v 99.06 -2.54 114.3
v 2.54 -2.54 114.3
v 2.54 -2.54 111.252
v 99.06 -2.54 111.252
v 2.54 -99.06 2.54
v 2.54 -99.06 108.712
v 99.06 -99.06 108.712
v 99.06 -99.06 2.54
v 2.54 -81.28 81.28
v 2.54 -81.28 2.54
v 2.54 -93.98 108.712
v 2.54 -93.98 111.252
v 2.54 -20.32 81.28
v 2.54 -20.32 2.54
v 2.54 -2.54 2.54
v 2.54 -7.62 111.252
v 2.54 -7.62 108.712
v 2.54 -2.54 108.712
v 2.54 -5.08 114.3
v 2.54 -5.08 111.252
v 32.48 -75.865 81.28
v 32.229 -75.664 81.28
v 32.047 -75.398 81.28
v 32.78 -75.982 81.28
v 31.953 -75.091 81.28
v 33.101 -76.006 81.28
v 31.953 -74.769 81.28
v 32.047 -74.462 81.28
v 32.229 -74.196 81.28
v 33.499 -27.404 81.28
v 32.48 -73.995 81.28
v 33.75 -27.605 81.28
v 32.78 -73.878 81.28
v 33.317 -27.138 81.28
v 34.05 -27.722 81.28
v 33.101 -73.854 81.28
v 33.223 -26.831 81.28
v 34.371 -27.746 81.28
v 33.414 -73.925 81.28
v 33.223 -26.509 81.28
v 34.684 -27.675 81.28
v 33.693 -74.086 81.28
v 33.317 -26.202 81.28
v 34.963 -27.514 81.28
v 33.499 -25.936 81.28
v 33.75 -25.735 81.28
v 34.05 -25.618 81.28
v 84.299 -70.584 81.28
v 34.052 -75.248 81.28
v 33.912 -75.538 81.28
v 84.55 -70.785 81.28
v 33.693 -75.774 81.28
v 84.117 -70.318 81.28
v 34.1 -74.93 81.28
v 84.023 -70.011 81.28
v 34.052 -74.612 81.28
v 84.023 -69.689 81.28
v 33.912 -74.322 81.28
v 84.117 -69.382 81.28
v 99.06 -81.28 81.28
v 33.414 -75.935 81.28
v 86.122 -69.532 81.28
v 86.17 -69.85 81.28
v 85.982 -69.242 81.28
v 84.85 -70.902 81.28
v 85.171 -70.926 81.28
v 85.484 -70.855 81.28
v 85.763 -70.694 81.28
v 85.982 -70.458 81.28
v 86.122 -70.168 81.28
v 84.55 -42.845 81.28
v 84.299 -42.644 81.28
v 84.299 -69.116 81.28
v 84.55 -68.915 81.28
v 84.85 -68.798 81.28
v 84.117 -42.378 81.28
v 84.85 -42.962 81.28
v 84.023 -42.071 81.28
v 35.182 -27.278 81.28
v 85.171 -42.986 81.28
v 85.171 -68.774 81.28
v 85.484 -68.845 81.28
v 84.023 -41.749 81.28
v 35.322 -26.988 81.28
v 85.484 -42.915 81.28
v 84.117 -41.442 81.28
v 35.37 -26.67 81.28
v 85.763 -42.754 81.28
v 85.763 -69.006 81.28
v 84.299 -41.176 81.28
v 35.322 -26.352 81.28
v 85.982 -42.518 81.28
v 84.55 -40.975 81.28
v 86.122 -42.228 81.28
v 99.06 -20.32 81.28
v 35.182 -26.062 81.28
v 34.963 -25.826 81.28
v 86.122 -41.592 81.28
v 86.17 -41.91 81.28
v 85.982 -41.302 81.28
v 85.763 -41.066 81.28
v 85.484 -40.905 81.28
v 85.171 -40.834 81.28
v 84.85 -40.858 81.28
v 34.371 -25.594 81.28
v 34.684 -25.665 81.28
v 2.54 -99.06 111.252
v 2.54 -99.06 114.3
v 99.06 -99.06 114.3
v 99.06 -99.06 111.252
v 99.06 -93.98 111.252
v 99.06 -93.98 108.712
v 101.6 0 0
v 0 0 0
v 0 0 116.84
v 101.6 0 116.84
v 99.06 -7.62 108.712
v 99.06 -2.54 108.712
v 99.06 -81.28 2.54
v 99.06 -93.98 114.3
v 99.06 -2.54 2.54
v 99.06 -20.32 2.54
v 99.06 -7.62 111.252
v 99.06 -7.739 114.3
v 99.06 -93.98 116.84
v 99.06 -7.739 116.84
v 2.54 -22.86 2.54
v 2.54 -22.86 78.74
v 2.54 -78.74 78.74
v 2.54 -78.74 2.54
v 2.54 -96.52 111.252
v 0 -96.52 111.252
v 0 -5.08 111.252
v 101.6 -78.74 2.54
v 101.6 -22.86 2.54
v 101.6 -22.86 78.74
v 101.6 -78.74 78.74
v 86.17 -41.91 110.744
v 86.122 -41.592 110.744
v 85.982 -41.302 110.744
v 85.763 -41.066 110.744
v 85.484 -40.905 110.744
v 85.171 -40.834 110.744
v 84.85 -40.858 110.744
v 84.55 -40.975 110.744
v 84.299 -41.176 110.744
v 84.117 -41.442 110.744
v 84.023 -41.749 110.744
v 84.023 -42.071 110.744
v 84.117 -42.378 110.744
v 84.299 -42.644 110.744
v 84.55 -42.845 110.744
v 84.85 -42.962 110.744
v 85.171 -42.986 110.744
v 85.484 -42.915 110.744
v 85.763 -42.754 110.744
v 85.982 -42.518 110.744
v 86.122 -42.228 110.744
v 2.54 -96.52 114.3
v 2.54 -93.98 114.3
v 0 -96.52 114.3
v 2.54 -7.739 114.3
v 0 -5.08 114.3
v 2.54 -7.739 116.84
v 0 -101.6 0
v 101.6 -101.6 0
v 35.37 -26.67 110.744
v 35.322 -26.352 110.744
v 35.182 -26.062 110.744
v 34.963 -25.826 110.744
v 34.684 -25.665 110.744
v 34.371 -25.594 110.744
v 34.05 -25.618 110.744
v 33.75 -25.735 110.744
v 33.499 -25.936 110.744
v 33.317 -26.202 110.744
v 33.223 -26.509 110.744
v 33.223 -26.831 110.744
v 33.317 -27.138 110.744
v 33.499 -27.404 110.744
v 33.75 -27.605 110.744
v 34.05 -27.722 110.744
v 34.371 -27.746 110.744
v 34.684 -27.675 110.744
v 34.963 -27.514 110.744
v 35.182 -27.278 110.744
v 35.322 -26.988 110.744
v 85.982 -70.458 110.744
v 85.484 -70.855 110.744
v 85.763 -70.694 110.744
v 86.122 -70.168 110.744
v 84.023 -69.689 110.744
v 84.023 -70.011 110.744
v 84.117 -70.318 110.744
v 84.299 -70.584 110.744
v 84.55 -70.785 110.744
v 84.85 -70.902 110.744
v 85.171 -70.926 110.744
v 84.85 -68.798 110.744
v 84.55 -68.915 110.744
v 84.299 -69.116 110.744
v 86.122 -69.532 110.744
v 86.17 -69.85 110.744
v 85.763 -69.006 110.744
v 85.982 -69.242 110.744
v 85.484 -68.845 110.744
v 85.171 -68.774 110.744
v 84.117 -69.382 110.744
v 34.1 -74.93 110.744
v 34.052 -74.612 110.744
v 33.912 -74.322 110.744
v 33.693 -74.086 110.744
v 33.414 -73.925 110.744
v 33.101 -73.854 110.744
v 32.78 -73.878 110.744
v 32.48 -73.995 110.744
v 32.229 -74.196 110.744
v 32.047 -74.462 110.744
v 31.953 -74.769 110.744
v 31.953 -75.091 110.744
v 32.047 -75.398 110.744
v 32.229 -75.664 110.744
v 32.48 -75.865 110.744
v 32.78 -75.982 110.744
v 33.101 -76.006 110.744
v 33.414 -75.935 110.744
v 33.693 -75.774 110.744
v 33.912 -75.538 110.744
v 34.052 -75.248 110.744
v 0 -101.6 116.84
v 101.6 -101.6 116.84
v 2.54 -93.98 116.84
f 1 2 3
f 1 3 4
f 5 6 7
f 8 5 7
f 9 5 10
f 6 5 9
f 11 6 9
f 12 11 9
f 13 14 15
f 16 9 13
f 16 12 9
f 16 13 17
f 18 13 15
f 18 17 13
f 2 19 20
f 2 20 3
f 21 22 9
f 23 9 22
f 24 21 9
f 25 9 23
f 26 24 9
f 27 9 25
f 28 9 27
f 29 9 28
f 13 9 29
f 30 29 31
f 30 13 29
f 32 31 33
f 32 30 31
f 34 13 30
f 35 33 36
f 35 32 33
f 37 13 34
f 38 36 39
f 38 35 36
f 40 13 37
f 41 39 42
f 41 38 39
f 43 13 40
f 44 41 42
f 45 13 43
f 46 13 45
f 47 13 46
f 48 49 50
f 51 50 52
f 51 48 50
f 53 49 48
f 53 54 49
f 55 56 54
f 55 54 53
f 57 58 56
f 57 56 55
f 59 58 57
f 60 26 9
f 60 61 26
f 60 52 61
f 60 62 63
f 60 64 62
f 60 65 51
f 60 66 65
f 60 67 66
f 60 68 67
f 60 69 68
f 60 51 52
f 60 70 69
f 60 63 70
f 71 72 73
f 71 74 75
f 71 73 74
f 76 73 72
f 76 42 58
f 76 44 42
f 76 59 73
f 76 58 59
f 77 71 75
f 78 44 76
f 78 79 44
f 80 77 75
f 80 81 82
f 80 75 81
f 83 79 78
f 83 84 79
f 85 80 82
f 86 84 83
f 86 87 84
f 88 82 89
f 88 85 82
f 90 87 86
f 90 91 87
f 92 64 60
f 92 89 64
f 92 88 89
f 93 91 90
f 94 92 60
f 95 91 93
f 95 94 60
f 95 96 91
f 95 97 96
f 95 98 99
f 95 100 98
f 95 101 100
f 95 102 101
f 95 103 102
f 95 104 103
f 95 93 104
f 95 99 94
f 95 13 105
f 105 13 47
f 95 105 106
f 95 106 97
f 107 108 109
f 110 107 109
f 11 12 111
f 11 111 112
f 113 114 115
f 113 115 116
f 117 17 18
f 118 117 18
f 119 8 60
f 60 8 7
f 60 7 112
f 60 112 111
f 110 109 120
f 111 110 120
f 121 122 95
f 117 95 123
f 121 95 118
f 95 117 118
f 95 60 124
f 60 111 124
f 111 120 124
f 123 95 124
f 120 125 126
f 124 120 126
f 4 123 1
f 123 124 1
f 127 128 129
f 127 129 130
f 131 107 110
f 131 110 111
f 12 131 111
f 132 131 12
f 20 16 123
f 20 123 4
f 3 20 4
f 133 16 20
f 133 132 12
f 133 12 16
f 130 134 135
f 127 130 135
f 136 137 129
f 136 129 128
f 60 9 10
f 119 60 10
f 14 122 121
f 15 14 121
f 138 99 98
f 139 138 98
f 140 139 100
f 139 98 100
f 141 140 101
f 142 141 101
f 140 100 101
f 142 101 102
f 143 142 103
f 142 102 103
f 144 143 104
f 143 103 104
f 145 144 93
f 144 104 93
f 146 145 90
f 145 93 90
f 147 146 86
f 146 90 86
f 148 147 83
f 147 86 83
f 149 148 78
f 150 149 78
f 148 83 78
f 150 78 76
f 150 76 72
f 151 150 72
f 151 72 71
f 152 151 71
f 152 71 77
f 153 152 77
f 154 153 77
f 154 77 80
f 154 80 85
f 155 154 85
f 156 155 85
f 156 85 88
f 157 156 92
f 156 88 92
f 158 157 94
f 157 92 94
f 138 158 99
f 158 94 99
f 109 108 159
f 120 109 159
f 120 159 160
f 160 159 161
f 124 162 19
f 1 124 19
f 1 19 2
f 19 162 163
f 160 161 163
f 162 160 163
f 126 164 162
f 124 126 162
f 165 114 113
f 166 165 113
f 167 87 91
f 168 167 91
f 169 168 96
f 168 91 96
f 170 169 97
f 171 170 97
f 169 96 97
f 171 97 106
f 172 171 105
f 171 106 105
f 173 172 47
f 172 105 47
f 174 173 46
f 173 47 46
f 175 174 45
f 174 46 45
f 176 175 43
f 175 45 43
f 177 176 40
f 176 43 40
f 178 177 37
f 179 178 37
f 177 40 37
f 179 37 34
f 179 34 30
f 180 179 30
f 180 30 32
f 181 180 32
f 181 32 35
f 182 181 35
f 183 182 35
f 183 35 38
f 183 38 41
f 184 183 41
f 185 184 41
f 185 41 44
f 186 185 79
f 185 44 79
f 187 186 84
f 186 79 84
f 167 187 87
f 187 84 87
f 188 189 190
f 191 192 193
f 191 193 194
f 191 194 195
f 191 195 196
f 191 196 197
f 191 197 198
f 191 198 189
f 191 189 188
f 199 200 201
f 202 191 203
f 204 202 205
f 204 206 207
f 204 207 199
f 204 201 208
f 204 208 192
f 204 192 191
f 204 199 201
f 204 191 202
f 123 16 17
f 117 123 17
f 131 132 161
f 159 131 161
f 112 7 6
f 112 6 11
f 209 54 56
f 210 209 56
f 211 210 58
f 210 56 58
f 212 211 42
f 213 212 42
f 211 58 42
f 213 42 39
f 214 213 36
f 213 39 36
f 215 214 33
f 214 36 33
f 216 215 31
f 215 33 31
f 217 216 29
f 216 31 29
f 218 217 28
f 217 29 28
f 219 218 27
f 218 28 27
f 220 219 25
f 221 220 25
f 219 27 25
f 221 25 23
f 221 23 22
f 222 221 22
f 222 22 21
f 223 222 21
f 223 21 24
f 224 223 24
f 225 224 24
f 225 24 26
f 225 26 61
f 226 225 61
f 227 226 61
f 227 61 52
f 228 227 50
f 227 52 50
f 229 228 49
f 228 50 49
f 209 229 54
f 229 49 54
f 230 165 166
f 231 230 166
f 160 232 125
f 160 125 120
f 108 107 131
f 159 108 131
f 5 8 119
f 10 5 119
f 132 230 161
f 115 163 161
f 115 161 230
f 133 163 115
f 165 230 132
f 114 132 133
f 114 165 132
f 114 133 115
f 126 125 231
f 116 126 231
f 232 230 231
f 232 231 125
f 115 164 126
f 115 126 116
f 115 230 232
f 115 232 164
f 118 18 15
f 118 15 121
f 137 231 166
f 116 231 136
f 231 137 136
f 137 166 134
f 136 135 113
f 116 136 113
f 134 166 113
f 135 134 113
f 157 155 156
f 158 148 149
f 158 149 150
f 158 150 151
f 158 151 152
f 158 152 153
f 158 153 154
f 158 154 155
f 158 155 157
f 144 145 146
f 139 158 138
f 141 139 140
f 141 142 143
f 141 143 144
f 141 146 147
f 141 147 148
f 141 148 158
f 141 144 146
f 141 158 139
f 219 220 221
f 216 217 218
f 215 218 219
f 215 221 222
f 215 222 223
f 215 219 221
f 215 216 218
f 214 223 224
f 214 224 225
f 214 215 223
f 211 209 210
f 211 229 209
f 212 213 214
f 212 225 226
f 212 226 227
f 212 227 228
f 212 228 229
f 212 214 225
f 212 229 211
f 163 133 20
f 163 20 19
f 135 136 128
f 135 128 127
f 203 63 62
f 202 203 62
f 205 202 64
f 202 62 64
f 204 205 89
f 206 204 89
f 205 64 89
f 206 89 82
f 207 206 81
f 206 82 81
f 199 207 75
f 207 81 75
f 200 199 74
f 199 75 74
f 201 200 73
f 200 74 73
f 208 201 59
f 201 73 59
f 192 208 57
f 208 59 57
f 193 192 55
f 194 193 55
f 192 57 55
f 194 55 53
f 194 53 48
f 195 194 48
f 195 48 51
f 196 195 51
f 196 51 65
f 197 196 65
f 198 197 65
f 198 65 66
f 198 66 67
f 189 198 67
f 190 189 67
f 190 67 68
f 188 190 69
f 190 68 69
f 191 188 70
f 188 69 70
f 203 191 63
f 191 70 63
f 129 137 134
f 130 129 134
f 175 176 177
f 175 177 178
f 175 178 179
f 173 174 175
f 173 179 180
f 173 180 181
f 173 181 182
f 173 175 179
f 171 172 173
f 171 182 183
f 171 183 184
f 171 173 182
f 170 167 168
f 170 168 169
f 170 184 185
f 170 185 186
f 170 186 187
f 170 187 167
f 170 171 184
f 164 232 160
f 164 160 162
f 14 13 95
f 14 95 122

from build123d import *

# Parameters (mm, degrees)
SKETCH1_W           = 101.6
SKETCH1_H           = 101.6
BOSS_EXTRUDE2_DEPTH = 116.84
SKETCH2_W           = 76.2
SKETCH2_H           = 55.88
CUT_EXTRUDE1_DEPTH  = 99.06
SKETCH3_W           = 111.76
SKETCH3_H           = 17.78
CUT_EXTRUDE2_DEPTH  = 96.52
SKETCH4_W           = 96.52
SKETCH4_H           = 96.52
CUT_EXTRUDE3_DEPTH  = 35.56
SKETCH5_R           = 1.0795
BOSS_EXTRUDE3_DEPTH = 29.464
SKETCH8_W           = 3.048
SKETCH8_H           = 91.44
CUT_EXTRUDE4_DEPTH  = 2.54
SKETCH10_W          = 2.54
SKETCH10_H          = 5.08
SKETCH10_H_2        = 5.198880867
BOSS_EXTRUDE4_DEPTH = 96.52


with BuildPart() as part:
    # Sketch1 → Boss-Extrude2 (new body)
    with BuildSketch(Plane.XY):
        with Locations((50.8, -50.8)):
            Rectangle(SKETCH1_W, SKETCH1_H)
    extrude(amount=BOSS_EXTRUDE2_DEPTH)

    # Sketch2 → Cut-Extrude1 (cut)
    with BuildSketch(Plane(origin=(101.6, 0, 0), x_dir=(0, 0, -1), z_dir=(1, 0, 0))):
        with Locations((-40.64, -50.8)):
            Rectangle(SKETCH2_W, SKETCH2_H)
    extrude(amount=-CUT_EXTRUDE1_DEPTH, mode=Mode.SUBTRACT)

    # Sketch3 → Cut-Extrude2 (cut)
    with BuildSketch(Plane(origin=(99.06, 0, 0), x_dir=(0, 0, -1), z_dir=(1, 0, 0))):
        with Locations((-58.42, -90.17)):
            Rectangle(SKETCH3_W, SKETCH3_H)
        with Locations((-58.42, -11.43)):
            Rectangle(SKETCH3_W, SKETCH3_H)
    extrude(amount=-CUT_EXTRUDE2_DEPTH, mode=Mode.SUBTRACT)

    # Sketch4 → Cut-Extrude3 (cut)
    with BuildSketch(Plane.XY.offset(116.84)):
        with Locations((50.8, -50.8)):
            Rectangle(SKETCH4_W, SKETCH4_H)
    extrude(amount=-CUT_EXTRUDE3_DEPTH, mode=Mode.SUBTRACT)

    # Sketch5 → Boss-Extrude3 (add)
    with BuildSketch(Plane.XY.offset(81.28)):
        with Locations((85.09, -41.91)):
            Circle(SKETCH5_R)
        with Locations((85.09, -69.85)):
            Circle(SKETCH5_R)
        with Locations((34.29, -26.67)):
            Circle(SKETCH5_R)
        with Locations((33.02, -74.93)):
            Circle(SKETCH5_R)
    extrude(amount=BOSS_EXTRUDE3_DEPTH)

    # Sketch8 → Cut-Extrude4 (cut)
    with BuildSketch(Plane.ZY):
        with Locations((112.776, -50.8)):
            Rectangle(SKETCH8_W, SKETCH8_H)
    extrude(amount=-CUT_EXTRUDE4_DEPTH, mode=Mode.SUBTRACT)

    # Sketch10 → Boss-Extrude4 (add)
    with BuildSketch(Plane(origin=(2.54, 0, 0), x_dir=(0, 0, -1), z_dir=(1, 0, 0))):
        with Locations((-115.57, -96.52)):
            Rectangle(SKETCH10_W, SKETCH10_H)
        with Locations((-109.982, -96.52)):
            Rectangle(SKETCH10_W, SKETCH10_H)
        with Locations((-115.57, -5.139440434)):
            Rectangle(SKETCH10_W, SKETCH10_H_2)
        with Locations((-109.982, -5.08)):
            Rectangle(SKETCH10_W, SKETCH10_H)
    extrude(amount=BOSS_EXTRUDE4_DEPTH)


solid = part.part
